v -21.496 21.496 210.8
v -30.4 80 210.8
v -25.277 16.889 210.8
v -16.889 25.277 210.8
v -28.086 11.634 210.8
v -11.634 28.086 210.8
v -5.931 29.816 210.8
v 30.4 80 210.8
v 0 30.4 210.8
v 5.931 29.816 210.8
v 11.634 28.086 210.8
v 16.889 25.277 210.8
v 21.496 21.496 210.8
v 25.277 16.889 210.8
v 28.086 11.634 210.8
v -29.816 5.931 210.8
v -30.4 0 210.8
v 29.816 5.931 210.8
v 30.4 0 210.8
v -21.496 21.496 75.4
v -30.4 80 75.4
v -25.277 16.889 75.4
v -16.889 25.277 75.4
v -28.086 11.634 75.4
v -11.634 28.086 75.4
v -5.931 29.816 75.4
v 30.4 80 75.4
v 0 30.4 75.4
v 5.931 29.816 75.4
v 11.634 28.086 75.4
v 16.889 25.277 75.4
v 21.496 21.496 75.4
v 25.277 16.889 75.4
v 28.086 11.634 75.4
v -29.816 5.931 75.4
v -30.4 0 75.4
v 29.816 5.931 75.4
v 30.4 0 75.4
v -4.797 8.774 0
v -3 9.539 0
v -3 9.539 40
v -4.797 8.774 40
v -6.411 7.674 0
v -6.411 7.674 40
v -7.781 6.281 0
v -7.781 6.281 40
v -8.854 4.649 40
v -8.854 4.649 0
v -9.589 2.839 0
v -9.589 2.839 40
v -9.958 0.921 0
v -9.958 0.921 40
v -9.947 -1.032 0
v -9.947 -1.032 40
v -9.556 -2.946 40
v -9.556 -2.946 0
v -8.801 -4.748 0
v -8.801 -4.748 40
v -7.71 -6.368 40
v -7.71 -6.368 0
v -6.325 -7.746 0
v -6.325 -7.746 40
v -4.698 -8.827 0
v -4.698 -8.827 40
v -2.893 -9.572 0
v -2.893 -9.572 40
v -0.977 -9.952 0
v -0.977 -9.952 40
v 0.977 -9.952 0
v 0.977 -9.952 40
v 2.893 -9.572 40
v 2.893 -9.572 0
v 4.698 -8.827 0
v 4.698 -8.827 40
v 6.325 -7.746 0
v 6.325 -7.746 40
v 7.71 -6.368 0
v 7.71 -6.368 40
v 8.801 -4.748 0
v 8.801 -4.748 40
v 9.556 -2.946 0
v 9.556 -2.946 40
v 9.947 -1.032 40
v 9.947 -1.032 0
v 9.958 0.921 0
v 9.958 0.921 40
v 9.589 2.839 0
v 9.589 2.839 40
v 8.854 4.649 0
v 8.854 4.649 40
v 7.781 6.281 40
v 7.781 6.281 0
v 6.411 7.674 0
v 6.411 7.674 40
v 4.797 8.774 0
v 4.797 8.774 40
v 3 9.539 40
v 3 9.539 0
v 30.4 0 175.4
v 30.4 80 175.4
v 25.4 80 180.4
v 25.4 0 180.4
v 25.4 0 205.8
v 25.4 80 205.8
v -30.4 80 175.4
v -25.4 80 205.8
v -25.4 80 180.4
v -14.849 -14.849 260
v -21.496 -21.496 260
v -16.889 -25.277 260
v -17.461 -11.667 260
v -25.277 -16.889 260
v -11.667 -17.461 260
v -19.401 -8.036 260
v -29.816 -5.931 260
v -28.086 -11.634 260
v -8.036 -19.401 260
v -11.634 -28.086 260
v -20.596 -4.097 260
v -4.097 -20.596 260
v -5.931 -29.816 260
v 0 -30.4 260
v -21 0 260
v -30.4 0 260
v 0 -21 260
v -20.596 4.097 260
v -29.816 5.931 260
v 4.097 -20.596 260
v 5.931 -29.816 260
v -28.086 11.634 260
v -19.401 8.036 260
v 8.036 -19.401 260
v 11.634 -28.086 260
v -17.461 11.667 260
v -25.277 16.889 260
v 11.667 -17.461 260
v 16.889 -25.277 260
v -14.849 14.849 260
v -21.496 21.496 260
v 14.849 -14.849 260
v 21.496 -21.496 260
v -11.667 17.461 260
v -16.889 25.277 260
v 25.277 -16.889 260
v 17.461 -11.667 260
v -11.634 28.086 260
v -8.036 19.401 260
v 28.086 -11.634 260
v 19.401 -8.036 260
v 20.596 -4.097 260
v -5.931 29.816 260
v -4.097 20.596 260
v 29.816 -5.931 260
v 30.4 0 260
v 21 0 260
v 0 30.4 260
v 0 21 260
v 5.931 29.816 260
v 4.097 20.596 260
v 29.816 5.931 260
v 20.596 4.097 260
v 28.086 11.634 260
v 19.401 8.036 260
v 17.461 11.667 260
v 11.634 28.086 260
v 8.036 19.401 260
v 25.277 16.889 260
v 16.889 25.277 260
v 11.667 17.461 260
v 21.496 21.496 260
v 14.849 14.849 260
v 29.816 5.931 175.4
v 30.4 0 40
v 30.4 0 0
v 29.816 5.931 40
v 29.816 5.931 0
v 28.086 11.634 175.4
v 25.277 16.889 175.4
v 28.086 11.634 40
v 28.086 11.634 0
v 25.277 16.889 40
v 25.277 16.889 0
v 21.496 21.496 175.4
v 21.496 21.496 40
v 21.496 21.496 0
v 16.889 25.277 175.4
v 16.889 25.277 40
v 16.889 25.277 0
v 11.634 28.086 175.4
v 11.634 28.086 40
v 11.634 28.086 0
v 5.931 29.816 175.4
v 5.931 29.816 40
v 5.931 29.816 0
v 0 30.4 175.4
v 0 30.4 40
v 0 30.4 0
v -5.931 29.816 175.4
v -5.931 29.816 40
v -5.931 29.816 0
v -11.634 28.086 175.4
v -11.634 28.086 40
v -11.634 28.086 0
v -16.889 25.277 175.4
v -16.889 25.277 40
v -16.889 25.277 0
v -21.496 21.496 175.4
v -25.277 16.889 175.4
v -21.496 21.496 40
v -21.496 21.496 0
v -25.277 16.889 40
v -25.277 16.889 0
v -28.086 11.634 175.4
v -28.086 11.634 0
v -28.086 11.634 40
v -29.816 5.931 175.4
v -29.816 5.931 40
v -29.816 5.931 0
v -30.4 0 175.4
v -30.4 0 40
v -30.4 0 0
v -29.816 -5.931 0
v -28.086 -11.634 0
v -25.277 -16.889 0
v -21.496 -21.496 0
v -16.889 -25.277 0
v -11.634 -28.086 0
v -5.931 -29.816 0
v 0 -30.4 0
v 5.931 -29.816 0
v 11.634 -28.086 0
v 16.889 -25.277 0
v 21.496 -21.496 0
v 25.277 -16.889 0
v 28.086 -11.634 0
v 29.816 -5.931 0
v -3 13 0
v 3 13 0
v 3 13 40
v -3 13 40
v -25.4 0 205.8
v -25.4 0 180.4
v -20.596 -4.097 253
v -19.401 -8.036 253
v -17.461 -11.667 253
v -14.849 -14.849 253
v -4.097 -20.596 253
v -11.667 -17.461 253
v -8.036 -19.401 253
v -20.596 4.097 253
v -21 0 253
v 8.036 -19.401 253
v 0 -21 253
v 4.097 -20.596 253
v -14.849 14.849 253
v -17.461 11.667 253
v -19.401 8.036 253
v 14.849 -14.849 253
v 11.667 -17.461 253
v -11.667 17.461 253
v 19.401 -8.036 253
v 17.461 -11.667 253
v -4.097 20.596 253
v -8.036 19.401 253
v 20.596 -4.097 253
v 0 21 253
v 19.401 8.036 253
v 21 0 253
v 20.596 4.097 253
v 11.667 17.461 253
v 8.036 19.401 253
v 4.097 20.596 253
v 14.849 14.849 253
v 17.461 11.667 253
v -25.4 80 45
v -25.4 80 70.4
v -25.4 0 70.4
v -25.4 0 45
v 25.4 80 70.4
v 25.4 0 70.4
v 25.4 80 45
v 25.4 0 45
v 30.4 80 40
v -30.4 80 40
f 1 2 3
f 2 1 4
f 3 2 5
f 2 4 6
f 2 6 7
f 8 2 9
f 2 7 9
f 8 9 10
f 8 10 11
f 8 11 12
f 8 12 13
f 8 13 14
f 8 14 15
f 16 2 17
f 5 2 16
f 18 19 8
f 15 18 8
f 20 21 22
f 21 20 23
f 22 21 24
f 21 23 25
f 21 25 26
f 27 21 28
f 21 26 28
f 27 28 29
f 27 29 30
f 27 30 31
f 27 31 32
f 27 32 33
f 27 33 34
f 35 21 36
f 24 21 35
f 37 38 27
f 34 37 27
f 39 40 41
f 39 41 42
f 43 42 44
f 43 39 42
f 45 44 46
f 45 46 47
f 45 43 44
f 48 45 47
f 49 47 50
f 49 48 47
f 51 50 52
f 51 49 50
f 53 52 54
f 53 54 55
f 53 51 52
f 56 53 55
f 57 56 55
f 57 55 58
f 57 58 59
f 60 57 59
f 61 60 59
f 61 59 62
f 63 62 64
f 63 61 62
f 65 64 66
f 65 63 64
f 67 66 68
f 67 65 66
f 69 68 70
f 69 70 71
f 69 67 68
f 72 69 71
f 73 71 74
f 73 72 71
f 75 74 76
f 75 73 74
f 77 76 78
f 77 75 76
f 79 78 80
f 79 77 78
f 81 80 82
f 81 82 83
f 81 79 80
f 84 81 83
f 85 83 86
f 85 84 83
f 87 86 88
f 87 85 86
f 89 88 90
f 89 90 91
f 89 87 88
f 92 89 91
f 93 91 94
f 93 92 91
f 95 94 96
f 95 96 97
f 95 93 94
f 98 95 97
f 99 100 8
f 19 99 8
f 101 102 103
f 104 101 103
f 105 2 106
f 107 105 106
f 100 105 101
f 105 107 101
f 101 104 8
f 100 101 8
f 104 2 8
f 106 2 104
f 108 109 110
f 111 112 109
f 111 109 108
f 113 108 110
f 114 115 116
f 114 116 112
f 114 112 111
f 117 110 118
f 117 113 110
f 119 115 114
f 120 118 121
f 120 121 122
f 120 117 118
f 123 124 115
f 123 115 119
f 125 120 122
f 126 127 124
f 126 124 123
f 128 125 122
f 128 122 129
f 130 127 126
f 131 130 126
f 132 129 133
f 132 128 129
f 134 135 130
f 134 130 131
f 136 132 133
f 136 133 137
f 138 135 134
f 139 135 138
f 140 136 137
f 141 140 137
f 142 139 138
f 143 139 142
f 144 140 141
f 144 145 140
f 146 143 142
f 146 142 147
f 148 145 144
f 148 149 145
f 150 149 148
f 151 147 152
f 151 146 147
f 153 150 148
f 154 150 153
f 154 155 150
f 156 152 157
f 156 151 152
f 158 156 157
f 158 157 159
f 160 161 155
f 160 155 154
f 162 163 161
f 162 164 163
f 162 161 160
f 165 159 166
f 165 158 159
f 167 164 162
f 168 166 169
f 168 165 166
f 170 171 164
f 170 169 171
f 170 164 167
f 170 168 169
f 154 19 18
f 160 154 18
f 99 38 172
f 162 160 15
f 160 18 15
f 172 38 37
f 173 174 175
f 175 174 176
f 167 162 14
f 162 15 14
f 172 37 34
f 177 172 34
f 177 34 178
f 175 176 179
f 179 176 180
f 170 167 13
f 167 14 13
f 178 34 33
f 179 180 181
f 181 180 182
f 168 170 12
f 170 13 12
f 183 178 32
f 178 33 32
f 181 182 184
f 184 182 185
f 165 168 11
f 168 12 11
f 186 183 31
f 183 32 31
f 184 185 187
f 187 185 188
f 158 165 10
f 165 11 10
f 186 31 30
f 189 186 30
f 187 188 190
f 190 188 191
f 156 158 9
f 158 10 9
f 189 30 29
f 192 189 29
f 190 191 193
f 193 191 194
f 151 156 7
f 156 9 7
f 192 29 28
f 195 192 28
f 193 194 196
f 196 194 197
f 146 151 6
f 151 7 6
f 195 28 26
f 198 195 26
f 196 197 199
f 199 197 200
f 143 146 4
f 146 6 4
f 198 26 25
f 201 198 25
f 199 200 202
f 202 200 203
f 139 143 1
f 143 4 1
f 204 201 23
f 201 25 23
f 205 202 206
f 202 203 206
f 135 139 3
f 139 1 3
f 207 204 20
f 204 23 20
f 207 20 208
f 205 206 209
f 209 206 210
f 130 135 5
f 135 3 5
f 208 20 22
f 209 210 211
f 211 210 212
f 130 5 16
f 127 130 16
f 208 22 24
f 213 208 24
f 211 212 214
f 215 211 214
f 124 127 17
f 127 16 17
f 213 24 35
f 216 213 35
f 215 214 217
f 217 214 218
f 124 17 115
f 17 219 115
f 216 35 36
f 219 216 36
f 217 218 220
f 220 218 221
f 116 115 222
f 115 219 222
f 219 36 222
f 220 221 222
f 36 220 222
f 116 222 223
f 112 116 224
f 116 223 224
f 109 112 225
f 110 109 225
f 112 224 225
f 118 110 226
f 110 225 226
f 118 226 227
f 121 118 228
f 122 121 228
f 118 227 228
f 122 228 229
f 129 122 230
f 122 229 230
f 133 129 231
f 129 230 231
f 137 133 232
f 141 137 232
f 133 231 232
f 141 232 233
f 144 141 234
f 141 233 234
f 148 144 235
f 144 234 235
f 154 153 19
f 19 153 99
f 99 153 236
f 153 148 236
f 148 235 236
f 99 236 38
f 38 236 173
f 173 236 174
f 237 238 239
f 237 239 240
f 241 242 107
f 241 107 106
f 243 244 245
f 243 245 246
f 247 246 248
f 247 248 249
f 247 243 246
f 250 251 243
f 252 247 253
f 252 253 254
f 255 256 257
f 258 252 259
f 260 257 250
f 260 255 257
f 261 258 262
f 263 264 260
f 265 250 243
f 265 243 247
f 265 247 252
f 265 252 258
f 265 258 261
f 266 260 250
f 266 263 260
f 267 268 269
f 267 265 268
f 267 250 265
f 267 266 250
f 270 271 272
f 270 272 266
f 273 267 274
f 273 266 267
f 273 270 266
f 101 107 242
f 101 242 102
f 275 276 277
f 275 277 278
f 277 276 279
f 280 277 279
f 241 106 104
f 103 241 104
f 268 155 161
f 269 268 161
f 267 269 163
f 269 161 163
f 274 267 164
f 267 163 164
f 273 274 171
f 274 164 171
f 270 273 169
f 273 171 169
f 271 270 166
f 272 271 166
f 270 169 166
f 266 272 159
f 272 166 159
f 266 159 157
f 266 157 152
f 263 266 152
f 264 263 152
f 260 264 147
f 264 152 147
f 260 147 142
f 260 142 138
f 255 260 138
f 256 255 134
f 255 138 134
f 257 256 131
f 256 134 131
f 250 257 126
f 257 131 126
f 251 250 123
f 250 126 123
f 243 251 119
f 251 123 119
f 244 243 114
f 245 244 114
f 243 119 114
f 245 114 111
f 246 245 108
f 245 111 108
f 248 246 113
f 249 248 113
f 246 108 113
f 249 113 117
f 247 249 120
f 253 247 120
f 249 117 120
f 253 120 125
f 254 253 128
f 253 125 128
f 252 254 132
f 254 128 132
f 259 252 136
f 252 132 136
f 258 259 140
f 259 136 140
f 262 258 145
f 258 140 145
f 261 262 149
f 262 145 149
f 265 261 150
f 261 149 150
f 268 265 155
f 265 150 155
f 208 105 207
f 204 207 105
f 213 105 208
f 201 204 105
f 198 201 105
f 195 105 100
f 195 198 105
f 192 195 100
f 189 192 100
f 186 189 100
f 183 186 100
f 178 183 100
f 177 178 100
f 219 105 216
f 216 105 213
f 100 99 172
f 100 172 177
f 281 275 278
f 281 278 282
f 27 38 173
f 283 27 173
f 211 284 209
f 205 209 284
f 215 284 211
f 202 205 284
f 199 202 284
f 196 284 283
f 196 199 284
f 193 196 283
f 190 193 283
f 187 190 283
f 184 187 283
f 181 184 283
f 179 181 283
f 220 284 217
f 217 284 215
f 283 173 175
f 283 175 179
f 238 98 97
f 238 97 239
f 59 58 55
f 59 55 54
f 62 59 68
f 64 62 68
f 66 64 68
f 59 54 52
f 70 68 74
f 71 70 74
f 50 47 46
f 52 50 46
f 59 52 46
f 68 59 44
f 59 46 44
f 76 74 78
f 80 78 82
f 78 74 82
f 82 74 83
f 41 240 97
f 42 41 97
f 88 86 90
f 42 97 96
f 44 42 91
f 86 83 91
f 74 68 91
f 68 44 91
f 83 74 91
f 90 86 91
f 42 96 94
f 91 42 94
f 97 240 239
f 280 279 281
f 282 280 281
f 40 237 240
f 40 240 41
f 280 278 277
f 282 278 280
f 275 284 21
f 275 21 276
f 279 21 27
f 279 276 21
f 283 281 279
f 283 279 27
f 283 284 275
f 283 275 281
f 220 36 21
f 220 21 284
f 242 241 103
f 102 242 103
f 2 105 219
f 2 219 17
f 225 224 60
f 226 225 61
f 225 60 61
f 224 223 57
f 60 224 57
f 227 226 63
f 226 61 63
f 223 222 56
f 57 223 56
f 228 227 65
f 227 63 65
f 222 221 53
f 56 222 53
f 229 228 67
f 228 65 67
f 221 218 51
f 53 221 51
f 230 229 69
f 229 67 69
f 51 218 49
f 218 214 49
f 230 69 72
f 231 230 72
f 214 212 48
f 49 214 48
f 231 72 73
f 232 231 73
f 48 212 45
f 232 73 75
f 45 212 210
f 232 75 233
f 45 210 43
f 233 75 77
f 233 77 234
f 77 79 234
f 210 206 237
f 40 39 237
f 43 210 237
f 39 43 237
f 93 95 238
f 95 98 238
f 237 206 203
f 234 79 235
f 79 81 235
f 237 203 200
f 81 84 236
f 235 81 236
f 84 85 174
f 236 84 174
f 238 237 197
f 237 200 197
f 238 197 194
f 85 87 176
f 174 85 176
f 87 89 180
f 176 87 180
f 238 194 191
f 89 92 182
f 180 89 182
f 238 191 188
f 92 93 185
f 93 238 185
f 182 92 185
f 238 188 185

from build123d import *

# Parameters (mm, degrees)
SKETCH1_R           = 30.4
BOSS_EXTRUDE1_DEPTH = 260
SKETCH2_W           = 60.8
SKETCH2_H           = 35.4
BOSS_EXTRUDE2_DEPTH = 80
SKETCH3_W           = 50.8
SKETCH3_H           = 25.4
CUT_EXTRUDE1_DEPTH  = 80
CUT_EXTRUDE2_DEPTH  = 40
SKETCH5_R           = 21
CUT_EXTRUDE3_DEPTH  = 7


with BuildPart() as part:
    # Sketch1 → Boss-Extrude1 (new body)
    with BuildSketch(Plane.XY):
        Circle(SKETCH1_R)
    extrude(amount=BOSS_EXTRUDE1_DEPTH)

    # Sketch2 → Boss-Extrude2 (add)
    with BuildSketch(Plane(origin=(0, 0, 0), x_dir=(1, 0, 0), z_dir=(0, 1, 0))):
        with Locations((0, -57.7)):
            Rectangle(SKETCH2_W, SKETCH2_H)
    boss_extrude2 = extrude(amount=BOSS_EXTRUDE2_DEPTH)

    # Sketch3 → Cut-Extrude1 (cut)
    with BuildSketch(Plane(origin=(0, 80, 0), x_dir=(1, 0, 0), z_dir=(0, 1, 0))):
        with Locations((0, -57.7)):
            Rectangle(SKETCH3_W, SKETCH3_H)
    cut_extrude1 = extrude(amount=-CUT_EXTRUDE1_DEPTH, mode=Mode.SUBTRACT)

    # Mirror2: Boss-Extrude2, Cut-Extrude1 across plane
    add(boss_extrude2.mirror(Plane.XY.offset(125.4)))
    add(cut_extrude1.mirror(Plane.XY.offset(125.4)), mode=Mode.SUBTRACT)

    # Sketch4 → Cut-Extrude2 (cut)
    with BuildSketch(Plane(origin=(0, 0, 0), x_dir=(-1, 0, 0), z_dir=(0, 0, -1))):
        with BuildLine():
            Line((-3, 9.539392014), (-3, 13))
            Line((-3, 13), (3, 13))
            Line((3, 13), (3, 9.539392014))
            ThreePointArc((3, 9.539392014), (0, -10), (-3, 9.539392014))
        make_face()
    extrude(amount=-CUT_EXTRUDE2_DEPTH, mode=Mode.SUBTRACT)

    # Sketch5 → Cut-Extrude3 (cut)
    with BuildSketch(Plane.XY.offset(260)):
        Circle(SKETCH5_R)
    extrude(amount=-CUT_EXTRUDE3_DEPTH, mode=Mode.SUBTRACT)


solid = part.part
